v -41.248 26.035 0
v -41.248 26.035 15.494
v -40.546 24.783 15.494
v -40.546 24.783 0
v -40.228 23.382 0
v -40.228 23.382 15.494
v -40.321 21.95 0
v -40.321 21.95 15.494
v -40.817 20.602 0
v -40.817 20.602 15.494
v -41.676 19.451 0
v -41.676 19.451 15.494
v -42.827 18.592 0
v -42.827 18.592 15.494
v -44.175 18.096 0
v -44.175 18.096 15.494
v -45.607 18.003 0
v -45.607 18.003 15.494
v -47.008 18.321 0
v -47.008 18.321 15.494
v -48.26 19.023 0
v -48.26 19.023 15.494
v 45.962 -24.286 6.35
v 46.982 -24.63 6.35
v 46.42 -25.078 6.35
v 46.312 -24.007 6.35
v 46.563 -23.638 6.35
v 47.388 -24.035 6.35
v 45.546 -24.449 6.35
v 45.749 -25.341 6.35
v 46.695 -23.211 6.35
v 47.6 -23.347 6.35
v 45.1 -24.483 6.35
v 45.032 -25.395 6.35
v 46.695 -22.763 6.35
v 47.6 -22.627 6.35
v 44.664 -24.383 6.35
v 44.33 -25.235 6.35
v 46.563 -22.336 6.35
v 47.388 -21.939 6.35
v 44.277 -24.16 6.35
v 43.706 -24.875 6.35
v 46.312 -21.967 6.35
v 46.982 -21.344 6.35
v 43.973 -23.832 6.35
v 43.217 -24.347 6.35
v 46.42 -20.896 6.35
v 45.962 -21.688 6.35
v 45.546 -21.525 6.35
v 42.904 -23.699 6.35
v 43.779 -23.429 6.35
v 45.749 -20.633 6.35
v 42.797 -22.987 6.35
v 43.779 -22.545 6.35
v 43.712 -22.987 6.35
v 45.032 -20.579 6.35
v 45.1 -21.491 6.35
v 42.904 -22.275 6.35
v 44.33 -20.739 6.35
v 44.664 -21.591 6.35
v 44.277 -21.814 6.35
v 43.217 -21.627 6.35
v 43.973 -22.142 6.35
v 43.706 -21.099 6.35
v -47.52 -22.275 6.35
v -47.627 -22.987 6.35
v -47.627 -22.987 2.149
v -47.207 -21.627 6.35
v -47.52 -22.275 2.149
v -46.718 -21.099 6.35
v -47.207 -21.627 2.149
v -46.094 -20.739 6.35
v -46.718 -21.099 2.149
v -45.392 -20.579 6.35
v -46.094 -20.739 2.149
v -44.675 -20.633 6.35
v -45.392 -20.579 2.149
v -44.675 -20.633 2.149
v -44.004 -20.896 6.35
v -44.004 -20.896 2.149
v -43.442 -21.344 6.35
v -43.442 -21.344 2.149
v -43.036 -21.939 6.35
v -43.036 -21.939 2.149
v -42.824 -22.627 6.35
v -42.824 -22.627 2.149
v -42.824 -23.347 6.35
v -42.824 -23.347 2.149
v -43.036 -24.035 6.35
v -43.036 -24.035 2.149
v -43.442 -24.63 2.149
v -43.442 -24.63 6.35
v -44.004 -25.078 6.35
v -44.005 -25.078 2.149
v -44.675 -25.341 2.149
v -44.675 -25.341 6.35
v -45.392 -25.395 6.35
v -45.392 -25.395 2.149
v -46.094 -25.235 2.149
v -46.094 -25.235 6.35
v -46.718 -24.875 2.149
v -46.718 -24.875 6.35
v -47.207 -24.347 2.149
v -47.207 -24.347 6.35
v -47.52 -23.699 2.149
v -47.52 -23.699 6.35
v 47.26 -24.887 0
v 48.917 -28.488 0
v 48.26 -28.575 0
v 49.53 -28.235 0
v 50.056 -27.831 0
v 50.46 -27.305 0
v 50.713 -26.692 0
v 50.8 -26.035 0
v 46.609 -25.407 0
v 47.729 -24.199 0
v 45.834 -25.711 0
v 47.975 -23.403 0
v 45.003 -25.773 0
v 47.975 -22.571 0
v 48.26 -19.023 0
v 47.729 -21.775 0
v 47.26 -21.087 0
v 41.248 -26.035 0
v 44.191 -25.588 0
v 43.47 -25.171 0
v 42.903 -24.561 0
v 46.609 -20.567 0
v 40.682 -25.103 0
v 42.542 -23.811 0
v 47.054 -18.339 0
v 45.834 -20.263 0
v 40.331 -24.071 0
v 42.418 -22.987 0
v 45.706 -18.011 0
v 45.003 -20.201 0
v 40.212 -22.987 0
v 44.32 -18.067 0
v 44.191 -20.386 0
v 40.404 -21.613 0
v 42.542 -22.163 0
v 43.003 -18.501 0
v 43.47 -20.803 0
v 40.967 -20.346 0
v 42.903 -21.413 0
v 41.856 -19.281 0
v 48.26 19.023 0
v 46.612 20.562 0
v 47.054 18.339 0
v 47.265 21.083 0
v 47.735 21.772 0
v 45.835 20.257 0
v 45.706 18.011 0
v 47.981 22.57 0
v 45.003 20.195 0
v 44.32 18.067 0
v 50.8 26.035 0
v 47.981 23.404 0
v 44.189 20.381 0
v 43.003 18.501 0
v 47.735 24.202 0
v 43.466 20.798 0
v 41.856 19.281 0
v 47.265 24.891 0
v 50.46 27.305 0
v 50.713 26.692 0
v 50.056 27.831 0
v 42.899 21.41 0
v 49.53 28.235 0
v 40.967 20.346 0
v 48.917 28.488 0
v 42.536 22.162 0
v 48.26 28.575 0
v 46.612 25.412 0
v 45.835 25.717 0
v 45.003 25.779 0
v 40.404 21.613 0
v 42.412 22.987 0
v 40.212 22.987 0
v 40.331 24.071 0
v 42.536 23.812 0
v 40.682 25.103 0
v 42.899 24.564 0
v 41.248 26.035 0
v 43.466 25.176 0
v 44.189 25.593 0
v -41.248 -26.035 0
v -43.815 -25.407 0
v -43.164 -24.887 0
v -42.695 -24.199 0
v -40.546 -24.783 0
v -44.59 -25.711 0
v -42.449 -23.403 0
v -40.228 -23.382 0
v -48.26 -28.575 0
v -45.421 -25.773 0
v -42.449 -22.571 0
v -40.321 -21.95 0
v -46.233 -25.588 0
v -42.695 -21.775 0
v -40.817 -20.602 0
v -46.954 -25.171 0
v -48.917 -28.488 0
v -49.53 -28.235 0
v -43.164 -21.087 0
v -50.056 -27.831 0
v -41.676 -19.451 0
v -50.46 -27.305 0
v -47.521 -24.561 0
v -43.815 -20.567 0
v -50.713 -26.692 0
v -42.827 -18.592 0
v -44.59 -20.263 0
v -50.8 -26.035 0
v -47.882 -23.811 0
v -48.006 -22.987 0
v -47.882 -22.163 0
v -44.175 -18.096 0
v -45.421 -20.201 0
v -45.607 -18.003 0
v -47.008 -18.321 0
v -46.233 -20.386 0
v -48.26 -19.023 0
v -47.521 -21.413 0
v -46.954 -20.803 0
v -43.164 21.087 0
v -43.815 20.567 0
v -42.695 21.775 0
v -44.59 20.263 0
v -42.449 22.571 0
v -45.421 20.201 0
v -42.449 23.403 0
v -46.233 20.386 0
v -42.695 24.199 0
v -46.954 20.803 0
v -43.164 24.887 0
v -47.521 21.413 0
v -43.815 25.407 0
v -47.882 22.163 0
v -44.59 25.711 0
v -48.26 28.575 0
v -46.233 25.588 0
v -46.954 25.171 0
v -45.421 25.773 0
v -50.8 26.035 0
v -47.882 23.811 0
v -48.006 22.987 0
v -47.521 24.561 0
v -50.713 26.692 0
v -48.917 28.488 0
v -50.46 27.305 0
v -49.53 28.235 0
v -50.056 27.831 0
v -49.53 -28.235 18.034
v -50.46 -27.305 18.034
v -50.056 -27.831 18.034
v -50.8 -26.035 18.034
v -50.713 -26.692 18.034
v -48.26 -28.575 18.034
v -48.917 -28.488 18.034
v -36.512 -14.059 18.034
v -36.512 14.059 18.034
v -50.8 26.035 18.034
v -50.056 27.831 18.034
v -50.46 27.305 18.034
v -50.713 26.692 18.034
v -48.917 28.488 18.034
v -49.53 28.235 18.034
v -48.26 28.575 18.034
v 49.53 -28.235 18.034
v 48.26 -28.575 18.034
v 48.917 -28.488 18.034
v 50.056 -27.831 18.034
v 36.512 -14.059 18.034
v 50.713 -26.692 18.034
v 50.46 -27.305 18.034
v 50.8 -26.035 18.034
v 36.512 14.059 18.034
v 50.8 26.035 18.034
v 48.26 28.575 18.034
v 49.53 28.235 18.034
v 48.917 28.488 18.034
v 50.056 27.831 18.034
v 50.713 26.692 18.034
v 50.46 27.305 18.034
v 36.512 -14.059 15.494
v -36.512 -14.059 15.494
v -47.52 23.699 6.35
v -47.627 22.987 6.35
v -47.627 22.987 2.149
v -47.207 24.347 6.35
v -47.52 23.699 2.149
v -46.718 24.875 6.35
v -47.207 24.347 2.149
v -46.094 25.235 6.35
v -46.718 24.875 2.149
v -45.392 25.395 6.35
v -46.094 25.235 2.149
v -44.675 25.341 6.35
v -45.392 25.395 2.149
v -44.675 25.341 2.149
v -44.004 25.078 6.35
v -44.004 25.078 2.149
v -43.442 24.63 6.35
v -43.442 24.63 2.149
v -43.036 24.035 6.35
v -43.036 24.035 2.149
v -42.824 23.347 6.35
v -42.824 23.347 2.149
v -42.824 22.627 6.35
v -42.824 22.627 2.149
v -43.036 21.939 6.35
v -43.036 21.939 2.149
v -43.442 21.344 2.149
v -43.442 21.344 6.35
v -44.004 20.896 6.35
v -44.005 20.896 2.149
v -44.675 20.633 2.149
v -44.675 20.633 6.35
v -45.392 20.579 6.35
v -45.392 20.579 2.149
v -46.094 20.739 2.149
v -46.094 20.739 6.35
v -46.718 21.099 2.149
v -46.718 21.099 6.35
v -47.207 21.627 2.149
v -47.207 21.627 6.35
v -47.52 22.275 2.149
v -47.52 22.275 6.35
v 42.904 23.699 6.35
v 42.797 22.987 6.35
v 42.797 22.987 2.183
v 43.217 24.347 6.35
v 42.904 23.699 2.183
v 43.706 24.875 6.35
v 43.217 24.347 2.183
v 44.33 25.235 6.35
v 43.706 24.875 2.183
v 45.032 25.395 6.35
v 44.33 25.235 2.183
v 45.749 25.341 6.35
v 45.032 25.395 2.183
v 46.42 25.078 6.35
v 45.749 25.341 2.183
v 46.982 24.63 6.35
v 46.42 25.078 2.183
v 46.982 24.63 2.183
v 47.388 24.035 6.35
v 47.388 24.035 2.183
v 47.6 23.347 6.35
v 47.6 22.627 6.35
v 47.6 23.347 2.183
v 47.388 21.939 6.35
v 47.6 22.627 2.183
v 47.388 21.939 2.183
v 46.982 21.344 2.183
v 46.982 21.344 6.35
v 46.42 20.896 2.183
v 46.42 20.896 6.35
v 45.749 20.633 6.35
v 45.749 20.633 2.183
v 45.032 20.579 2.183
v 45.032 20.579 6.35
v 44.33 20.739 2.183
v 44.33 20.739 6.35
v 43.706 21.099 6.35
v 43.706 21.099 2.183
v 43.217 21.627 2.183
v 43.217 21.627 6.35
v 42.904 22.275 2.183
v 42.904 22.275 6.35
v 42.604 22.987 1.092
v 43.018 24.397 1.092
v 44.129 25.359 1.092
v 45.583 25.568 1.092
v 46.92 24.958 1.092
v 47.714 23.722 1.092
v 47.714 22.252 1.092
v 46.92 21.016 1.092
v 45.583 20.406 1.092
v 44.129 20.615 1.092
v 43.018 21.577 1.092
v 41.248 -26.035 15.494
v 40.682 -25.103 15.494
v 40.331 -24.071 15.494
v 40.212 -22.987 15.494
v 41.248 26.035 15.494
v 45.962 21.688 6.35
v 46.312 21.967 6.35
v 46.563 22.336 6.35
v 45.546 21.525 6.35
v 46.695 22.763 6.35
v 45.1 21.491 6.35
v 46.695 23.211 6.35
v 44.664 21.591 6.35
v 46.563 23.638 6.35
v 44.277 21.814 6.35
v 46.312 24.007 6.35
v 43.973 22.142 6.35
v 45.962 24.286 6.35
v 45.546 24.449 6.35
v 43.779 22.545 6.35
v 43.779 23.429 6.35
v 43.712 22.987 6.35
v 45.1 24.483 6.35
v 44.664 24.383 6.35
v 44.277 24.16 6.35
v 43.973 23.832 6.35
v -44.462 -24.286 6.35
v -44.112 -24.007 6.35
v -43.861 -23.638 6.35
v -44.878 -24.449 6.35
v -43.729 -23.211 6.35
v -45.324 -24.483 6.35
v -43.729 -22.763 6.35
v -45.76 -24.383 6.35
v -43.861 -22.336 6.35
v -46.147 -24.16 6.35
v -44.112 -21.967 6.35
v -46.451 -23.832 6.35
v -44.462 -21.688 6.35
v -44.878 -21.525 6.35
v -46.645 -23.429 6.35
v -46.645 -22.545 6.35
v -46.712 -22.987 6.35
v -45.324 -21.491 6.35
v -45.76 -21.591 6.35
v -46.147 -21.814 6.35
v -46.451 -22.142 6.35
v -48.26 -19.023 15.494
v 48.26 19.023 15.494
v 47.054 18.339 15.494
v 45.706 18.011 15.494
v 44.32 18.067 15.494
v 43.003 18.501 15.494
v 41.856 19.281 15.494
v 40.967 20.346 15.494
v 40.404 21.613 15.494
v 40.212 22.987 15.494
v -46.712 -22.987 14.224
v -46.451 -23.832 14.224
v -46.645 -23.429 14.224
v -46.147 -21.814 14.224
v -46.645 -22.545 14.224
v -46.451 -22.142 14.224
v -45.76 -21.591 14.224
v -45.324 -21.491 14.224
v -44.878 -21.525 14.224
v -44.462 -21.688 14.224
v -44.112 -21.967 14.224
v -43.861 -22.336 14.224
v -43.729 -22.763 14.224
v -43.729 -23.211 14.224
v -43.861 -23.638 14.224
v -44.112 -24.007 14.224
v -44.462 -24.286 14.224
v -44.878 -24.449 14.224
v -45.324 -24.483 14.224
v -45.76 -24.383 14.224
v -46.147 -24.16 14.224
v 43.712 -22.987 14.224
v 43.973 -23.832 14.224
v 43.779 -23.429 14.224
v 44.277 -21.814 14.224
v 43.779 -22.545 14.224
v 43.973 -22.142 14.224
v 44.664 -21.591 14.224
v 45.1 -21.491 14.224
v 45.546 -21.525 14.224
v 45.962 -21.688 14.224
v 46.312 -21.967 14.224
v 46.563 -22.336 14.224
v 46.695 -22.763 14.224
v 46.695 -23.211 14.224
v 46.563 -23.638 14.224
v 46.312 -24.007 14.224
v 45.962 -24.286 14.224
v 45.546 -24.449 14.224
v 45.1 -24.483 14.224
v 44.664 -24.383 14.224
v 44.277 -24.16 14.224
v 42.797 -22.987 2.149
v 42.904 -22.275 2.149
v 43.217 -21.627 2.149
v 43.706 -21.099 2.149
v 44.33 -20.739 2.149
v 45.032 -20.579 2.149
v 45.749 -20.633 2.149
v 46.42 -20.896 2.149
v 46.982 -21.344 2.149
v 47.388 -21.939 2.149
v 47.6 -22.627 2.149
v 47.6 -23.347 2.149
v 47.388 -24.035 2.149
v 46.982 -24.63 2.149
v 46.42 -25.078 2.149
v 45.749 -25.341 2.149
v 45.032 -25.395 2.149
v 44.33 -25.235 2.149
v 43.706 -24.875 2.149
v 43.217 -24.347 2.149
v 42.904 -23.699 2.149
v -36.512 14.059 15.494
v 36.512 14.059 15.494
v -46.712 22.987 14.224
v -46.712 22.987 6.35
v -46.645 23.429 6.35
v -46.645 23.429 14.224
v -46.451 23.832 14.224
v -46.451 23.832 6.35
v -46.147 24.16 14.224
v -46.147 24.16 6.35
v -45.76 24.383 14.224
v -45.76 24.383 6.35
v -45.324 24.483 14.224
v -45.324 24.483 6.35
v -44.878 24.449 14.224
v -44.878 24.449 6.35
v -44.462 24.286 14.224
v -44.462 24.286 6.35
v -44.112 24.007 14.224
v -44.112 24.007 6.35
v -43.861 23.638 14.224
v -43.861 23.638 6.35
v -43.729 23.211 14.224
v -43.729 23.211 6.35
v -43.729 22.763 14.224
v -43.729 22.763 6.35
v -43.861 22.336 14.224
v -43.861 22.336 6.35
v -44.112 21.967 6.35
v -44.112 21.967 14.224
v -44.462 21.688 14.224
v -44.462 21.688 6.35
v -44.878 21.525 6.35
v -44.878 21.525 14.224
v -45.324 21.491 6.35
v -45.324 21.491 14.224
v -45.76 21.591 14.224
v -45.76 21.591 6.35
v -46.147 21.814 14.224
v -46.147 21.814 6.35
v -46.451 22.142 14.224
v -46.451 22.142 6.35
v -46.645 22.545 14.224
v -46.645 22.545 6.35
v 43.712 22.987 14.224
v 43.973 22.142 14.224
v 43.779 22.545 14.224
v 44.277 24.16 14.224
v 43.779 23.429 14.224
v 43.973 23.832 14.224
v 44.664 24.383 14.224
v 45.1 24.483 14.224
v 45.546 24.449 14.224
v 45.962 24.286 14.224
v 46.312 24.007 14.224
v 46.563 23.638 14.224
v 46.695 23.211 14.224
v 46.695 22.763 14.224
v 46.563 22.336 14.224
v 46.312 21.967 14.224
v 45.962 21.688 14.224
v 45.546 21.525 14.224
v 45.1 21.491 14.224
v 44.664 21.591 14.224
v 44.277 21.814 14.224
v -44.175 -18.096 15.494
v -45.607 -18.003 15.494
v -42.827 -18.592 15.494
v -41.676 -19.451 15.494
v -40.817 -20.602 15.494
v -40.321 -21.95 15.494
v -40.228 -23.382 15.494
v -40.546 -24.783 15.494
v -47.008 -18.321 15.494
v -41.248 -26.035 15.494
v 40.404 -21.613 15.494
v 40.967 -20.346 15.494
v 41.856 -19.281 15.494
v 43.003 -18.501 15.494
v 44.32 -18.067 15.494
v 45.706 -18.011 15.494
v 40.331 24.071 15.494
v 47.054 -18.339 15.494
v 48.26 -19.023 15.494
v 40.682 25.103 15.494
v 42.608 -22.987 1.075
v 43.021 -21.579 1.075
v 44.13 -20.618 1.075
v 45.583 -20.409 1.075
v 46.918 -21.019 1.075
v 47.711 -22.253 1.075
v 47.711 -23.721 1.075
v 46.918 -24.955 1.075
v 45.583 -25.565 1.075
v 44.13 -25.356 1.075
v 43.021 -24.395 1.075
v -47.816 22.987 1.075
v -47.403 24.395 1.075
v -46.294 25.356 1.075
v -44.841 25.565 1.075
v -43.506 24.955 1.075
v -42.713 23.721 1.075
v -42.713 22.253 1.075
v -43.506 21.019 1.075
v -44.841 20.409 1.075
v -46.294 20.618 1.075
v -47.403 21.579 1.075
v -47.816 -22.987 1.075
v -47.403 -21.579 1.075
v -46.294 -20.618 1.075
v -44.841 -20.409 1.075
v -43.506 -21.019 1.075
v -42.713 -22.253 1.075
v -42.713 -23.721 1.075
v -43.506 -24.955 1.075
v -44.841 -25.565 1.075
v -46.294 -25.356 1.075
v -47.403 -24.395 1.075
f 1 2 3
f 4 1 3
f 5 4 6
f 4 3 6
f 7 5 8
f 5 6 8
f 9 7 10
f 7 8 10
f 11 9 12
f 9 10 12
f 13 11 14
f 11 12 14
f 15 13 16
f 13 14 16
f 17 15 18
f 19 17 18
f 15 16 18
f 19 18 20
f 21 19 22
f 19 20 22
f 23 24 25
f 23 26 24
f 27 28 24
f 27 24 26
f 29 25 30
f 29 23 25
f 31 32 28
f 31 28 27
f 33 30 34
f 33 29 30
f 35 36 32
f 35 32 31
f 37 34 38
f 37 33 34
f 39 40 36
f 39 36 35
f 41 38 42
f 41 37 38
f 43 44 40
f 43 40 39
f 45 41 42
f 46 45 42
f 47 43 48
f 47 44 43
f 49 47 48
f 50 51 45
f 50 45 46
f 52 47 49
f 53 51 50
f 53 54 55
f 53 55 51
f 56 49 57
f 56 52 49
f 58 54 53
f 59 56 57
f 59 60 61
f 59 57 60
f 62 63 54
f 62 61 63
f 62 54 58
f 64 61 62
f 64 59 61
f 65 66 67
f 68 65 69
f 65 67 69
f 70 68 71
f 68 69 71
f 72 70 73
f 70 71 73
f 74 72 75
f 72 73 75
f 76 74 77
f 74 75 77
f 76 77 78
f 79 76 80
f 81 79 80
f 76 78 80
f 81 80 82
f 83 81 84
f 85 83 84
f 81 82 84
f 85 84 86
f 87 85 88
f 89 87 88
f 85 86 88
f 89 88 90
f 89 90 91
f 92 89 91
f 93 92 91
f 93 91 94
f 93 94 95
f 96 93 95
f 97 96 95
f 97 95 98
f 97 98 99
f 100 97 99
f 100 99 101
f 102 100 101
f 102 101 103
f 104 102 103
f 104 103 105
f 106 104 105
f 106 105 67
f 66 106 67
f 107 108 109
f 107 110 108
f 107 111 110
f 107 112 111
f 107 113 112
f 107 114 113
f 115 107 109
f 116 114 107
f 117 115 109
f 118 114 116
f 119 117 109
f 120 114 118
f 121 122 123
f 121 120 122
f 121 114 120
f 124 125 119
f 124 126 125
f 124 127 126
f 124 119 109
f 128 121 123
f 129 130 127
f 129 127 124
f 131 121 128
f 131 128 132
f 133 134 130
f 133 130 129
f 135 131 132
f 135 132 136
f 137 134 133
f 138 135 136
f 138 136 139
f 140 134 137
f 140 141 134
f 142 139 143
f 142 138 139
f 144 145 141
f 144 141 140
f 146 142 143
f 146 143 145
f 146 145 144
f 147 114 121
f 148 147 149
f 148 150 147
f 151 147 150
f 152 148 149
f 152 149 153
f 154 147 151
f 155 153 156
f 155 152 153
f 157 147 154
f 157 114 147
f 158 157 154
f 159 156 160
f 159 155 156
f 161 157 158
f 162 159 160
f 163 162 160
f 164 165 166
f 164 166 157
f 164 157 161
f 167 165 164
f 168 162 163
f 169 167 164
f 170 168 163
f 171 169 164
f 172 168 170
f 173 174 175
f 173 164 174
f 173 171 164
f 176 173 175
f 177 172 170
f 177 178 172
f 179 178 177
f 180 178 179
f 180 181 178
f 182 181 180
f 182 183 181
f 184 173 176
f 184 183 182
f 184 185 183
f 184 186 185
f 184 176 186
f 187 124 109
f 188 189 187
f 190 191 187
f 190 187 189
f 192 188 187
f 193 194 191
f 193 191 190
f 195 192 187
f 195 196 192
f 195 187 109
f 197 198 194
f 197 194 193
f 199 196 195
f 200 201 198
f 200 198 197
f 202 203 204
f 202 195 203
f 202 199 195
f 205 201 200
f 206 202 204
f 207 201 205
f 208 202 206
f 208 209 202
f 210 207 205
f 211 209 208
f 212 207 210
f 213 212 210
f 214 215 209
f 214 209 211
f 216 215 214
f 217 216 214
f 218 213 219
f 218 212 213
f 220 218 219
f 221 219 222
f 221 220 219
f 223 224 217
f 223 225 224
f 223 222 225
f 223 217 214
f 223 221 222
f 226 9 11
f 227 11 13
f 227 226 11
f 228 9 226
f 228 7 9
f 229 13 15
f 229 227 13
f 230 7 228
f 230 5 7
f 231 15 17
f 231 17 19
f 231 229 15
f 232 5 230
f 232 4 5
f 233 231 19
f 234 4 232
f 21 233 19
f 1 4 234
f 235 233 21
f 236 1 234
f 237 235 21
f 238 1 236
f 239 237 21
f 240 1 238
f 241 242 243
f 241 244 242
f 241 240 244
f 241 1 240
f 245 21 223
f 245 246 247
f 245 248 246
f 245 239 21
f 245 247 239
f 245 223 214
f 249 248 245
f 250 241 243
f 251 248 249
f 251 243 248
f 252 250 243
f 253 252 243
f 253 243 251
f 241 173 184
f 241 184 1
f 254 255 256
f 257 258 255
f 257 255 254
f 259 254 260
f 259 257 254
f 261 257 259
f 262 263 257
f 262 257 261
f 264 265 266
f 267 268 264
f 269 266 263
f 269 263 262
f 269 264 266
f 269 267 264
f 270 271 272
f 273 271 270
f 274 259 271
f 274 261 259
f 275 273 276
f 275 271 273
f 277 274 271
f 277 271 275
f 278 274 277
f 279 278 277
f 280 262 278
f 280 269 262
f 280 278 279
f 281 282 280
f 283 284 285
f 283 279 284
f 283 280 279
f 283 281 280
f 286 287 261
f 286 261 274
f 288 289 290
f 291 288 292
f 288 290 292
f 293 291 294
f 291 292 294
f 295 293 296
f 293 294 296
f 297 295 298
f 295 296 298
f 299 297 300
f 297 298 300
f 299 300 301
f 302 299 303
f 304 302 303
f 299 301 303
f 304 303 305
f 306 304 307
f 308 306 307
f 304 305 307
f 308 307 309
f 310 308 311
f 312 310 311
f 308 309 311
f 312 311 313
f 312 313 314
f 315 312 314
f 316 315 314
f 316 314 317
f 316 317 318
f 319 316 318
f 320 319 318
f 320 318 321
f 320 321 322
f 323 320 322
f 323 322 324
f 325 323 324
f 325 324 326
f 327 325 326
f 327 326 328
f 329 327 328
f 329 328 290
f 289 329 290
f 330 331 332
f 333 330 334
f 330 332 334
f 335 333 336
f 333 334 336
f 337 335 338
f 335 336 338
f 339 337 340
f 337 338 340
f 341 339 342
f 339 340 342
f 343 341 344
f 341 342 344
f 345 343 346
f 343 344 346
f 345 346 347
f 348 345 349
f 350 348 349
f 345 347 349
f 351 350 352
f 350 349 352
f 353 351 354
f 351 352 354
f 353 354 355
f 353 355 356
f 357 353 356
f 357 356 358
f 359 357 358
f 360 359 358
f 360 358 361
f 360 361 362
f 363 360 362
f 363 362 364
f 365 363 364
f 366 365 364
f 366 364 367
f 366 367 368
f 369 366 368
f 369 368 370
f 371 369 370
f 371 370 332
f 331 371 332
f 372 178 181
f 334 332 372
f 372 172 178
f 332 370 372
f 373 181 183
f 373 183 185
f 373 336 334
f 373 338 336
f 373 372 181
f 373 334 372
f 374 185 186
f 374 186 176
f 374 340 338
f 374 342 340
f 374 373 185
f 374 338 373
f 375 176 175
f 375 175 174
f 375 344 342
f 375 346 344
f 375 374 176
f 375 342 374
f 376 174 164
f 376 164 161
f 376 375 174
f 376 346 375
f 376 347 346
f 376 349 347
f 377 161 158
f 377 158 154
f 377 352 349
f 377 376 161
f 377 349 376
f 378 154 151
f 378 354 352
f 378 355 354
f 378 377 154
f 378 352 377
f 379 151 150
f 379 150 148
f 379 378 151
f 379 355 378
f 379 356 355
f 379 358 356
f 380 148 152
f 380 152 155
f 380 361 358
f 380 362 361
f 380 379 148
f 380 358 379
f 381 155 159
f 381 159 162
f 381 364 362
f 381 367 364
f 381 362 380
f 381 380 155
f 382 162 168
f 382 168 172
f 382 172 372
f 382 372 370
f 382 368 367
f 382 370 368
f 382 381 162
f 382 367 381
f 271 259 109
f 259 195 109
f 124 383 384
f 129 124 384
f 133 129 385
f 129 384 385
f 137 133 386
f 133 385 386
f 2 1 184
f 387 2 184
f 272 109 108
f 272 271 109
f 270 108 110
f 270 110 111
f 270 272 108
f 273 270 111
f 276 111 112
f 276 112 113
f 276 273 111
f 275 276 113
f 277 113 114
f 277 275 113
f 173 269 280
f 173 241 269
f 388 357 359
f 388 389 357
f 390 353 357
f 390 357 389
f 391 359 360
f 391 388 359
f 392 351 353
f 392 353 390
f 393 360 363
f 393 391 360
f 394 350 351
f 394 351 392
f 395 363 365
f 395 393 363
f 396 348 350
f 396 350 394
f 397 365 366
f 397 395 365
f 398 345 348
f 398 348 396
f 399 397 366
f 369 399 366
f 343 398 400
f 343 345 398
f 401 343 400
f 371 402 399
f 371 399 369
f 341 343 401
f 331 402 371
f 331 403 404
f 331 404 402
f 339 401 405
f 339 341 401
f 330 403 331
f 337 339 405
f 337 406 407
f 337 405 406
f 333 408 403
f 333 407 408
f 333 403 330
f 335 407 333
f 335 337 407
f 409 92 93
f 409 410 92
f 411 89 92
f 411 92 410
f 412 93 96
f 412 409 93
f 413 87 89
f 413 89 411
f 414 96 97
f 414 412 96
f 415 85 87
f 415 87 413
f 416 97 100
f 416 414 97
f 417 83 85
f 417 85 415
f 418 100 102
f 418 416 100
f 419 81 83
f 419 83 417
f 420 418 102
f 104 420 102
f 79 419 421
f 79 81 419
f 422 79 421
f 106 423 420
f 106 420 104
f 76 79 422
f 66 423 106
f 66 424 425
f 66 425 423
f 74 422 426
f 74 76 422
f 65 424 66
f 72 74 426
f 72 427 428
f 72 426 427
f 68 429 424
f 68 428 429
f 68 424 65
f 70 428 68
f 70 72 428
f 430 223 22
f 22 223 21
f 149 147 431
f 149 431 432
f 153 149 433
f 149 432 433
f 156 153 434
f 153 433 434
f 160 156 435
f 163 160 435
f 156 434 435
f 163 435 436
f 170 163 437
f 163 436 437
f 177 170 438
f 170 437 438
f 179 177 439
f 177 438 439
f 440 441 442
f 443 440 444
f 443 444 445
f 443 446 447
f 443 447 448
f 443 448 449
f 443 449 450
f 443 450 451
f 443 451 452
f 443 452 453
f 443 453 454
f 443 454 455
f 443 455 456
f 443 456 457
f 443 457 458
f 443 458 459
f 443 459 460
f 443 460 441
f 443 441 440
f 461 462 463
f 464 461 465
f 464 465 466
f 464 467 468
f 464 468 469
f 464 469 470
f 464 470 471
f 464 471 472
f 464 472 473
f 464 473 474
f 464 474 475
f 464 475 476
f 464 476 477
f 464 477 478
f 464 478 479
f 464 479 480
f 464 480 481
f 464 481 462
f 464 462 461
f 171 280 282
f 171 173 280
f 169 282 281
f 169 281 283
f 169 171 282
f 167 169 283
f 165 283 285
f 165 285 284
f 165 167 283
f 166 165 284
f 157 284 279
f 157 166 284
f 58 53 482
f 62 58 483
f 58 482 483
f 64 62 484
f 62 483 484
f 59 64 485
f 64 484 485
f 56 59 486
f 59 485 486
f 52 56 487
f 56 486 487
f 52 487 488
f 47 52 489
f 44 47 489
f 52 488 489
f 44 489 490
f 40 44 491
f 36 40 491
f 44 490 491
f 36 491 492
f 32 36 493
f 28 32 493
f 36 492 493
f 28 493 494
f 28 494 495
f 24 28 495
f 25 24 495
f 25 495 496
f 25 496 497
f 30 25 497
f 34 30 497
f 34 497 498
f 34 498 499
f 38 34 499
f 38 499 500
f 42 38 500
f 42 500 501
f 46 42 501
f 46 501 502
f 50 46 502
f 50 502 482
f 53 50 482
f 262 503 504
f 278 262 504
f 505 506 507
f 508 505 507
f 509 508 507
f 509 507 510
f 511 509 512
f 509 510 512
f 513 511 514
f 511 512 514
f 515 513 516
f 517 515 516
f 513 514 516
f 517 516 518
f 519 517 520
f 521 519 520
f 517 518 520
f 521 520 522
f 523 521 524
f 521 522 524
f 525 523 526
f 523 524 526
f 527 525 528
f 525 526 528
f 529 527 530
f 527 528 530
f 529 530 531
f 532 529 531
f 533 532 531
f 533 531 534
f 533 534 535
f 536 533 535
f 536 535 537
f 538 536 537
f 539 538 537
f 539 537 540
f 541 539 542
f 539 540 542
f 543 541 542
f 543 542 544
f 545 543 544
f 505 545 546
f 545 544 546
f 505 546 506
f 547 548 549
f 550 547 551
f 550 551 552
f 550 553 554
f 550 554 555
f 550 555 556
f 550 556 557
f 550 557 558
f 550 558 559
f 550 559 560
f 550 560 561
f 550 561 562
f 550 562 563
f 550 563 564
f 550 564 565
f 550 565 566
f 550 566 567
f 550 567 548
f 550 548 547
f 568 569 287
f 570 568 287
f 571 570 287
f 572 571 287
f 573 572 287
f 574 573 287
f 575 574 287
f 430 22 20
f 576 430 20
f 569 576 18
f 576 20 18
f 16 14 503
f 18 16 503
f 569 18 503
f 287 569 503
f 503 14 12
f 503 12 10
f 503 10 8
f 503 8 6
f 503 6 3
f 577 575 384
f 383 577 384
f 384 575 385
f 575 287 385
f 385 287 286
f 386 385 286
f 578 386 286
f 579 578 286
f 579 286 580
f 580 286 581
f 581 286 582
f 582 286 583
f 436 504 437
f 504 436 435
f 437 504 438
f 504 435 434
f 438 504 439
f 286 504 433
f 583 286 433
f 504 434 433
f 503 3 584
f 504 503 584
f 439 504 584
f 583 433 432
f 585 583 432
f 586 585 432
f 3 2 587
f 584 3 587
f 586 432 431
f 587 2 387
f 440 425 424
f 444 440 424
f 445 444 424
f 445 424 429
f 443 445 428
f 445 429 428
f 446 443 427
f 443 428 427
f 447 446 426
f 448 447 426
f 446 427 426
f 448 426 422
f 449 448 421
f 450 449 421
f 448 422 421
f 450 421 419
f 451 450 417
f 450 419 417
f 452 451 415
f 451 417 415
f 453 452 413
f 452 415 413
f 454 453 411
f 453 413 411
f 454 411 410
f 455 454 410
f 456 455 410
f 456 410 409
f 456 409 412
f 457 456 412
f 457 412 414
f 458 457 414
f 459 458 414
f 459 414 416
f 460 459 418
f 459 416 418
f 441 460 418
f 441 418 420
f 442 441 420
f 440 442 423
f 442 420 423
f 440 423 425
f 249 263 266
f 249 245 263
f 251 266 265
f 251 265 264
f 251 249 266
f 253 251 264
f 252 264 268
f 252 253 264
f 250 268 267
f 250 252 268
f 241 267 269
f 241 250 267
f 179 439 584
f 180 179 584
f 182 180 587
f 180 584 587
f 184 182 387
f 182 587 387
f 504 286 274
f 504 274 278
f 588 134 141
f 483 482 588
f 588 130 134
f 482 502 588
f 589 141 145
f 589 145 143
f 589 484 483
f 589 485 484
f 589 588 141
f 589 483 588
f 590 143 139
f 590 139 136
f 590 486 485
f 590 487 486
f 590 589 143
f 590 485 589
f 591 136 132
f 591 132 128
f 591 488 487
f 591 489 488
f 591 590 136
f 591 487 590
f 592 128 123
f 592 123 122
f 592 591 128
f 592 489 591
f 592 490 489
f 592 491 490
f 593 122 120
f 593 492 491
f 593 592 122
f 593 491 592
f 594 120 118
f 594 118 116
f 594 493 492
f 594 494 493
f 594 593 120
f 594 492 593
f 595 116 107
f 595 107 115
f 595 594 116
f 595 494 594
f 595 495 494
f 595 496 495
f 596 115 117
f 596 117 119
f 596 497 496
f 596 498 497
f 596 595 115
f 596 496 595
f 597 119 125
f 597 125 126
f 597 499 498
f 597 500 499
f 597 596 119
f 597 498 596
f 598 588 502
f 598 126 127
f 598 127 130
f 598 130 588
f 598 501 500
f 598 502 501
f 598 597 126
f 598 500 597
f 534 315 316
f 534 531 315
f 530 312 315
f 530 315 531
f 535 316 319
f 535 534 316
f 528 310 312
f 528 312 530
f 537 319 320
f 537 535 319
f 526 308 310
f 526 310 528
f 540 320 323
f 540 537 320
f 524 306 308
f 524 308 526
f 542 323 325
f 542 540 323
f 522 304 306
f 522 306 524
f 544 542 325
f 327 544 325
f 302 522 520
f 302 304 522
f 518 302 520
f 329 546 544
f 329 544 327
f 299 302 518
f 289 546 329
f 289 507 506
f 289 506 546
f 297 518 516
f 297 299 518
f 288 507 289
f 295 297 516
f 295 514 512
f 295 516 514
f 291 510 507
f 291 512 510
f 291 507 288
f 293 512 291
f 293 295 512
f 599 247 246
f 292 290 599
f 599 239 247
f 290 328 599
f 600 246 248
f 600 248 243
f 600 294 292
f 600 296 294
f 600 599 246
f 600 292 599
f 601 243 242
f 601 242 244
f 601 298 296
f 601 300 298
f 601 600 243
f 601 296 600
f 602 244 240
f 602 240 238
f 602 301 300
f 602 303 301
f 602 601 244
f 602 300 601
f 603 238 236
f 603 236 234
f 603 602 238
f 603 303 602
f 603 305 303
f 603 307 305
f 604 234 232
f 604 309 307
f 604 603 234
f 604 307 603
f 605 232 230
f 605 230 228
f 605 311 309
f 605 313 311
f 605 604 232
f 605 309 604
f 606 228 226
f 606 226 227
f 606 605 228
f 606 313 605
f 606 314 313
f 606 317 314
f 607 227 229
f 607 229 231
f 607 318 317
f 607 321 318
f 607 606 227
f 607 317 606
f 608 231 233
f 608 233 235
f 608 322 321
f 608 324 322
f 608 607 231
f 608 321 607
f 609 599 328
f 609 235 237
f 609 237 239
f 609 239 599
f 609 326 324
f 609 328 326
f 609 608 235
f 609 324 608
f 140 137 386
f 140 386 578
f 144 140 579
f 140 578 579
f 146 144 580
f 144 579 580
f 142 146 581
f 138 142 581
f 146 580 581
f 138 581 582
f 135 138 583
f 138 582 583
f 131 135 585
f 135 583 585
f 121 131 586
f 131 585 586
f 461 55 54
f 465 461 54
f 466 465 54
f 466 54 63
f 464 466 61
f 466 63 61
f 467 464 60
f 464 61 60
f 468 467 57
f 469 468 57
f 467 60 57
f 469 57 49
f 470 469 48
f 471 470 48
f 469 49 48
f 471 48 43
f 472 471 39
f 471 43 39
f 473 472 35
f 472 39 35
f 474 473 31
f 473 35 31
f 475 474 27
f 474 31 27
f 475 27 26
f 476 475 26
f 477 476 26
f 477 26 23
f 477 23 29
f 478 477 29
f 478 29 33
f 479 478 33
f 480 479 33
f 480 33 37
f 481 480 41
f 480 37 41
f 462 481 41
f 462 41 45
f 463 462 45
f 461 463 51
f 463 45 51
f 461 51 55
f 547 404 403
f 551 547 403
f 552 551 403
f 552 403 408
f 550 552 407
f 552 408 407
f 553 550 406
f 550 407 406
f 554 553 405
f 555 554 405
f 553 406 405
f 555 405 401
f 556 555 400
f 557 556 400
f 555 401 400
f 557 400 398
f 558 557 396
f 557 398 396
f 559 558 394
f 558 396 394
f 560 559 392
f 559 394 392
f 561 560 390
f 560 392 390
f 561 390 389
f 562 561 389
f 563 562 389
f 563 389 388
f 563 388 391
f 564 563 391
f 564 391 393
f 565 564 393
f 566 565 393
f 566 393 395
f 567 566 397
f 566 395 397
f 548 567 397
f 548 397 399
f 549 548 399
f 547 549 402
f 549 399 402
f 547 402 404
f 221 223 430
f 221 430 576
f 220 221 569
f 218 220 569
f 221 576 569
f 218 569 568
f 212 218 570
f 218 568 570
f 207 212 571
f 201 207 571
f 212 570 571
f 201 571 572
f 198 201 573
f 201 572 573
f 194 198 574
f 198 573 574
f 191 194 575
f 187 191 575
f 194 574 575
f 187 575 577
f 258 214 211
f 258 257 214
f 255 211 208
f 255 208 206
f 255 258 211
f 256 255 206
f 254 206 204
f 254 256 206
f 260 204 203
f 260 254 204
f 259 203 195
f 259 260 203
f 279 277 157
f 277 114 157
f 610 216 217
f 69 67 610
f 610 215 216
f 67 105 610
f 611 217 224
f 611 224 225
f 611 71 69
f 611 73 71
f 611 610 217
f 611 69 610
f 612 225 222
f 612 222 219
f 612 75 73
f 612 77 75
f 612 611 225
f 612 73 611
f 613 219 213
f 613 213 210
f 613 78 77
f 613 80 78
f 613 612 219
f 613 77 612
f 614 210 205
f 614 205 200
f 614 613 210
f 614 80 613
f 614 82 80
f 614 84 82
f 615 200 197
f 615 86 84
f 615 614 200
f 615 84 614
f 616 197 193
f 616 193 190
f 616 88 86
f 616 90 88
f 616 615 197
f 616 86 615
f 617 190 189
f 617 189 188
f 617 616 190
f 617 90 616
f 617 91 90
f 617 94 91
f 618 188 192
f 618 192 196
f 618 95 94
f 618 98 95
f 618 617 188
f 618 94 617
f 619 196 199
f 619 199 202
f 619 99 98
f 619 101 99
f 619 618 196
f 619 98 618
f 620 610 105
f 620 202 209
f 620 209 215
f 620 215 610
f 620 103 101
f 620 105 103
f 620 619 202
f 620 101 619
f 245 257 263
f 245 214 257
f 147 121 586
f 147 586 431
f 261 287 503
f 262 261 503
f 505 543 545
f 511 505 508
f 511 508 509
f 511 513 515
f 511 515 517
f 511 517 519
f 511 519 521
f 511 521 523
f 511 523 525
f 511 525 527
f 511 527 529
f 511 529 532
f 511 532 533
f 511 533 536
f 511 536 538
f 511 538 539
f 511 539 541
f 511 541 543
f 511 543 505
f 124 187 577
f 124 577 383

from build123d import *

# Parameters (mm, degrees)
SKETCH1_W           = 101.6
SKETCH1_H           = 57.15
SKETCH1_W_2         = 96.52
SKETCH1_H_2         = 52.07
BOSS_EXTRUDE1_DEPTH = 15.494
SKETCH2_W           = 101.6
SKETCH2_H           = 57.15
SKETCH2_W_2         = 73.025
SKETCH2_H_2         = 28.1178
BOSS_EXTRUDE2_DEPTH = 2.54
SKETCH3_R           = 5
BOSS_EXTRUDE3_DEPTH = 15.494
SKETCH4_R           = 2.415
CUT_EXTRUDE1_DEPTH  = 6.35
SKETCH5_R           = 1.5
CUT_EXTRUDE2_DEPTH  = 7.874
FILLET1_R           = 2.54


with BuildPart() as part:
    # Sketch1 → Boss-Extrude1 (new body)
    with BuildSketch(Plane.XY):
        Rectangle(SKETCH1_W, SKETCH1_H)
        Rectangle(SKETCH1_W_2, SKETCH1_H_2, mode=Mode.SUBTRACT)
    extrude(amount=BOSS_EXTRUDE1_DEPTH)

    # Sketch2 → Boss-Extrude2 (add)
    with BuildSketch(Plane.XY.offset(15.494)):
        Rectangle(SKETCH2_W, SKETCH2_H)
        Rectangle(SKETCH2_W_2, SKETCH2_H_2, mode=Mode.SUBTRACT)
    extrude(amount=BOSS_EXTRUDE2_DEPTH)

    # Sketch3 → Boss-Extrude3 (add)
    with BuildSketch(Plane(origin=(0, 0, 15.494), x_dir=(-1, 0, 0), z_dir=(0, 0, -1))):
        with BuildLine():
            ThreePointArc((-48.26, 19.023454113), (-43.002927797, 18.501467702), (-40.212, 22.987))
            ThreePointArc((-40.212, 22.987), (-40.478199759, 24.59670037), (-41.248454113, 26.035))
            Line((-41.248454113, 26.035), (-48.26, 26.035))
            Line((-48.26, 26.035), (-48.26, 19.023454113))
        make_face()
        with BuildLine():
            Line((-48.26, 26.035), (-41.248454113, 26.035))
            ThreePointArc((-41.248454113, 26.035), (-48.747533906, 26.522533906), (-48.26, 19.023454113))
            Line((-48.26, 19.023454113), (-48.26, 26.035))
        make_face()
        with BuildLine():
            Line((48.26, 26.035), (41.248454113, 26.035))
            ThreePointArc((41.248454113, 26.035), (41.676466094, 19.451466094), (48.26, 19.023454113))
            Line((48.26, 19.023454113), (48.26, 26.035))
        make_face()
        with BuildLine():
            ThreePointArc((50.212, 22.987), (46.82170037, 27.720800241), (41.248454113, 26.035))
            Line((41.248454113, 26.035), (48.26, 26.035))
            Line((48.26, 26.035), (48.26, 19.023454113))
            ThreePointArc((48.26, 19.023454113), (49.697532298, 20.777927797), (50.212, 22.987))
        make_face()
        with BuildLine():
            Line((-48.26, -26.035), (-48.26, -19.023454113))
            ThreePointArc((-48.26, -19.023454113), (-48.747533906, -26.522533906), (-41.248454113, -26.035))
            Line((-41.248454113, -26.035), (-48.26, -26.035))
        make_face()
        with BuildLine():
            ThreePointArc((-40.212, -22.987), (-43.002927797, -18.501467702), (-48.26, -19.023454113))
            Line((-48.26, -19.023454113), (-48.26, -26.035))
            Line((-48.26, -26.035), (-41.248454113, -26.035))
            ThreePointArc((-41.248454113, -26.035), (-40.478199759, -24.59670037), (-40.212, -22.987))
        make_face()
        with Locations((45.212, -22.987)):
            Circle(SKETCH3_R)
    extrude(amount=BOSS_EXTRUDE3_DEPTH)

    # Sketch4 → Cut-Extrude1 (cut)
    with BuildSketch(Plane(origin=(0, 0, 0), x_dir=(-1, 0, 0), z_dir=(0, 0, -1))):
        with Locations((-45.212, 22.987)):
            Circle(SKETCH4_R)
        with Locations((-45.212, -22.987)):
            Circle(SKETCH4_R)
        with Locations((45.212, -22.987)):
            Circle(SKETCH4_R)
        with Locations((45.212, 22.987)):
            Circle(SKETCH4_R)
    extrude(amount=-CUT_EXTRUDE1_DEPTH, mode=Mode.SUBTRACT)

    # Sketch5 → Cut-Extrude2 (cut)
    with BuildSketch(Plane(origin=(0, 0, 6.35), x_dir=(-1, 0, 0), z_dir=(0, 0, -1))):
        with Locations((-45.212, 22.987)):
            Circle(SKETCH5_R)
        with Locations((45.212, -22.987)):
            Circle(SKETCH5_R)
        with Locations((-45.212, -22.987)):
            Circle(SKETCH5_R)
        with Locations((45.212, 22.987)):
            Circle(SKETCH5_R)
    extrude(amount=-CUT_EXTRUDE2_DEPTH, mode=Mode.SUBTRACT)

    # Sketch6 → Cut-Revolve1 (revolve, cut)
    with BuildSketch(Plane(origin=(0, 22.987, 0), x_dir=(0, 0, -1), z_dir=(0, -1, 0)), mode=Mode.PRIVATE) as cut_revolve1_sk:
        Polygon((0, 48.012), (-6.35, 46.892323673), (-6.35, 45.212), (0, 45.212), align=None)
    revolve(cut_revolve1_sk.sketch.rotate(Axis((45.212, 22.987, 6.35), (0, 0, -1)), 180), axis=Axis((45.212, 22.987, 6.35), (0, 0, -1)), mode=Mode.SUBTRACT)

    # Sketch7 → Cut-Revolve2 (revolve, cut)
    with BuildSketch(Plane(origin=(0, -22.987, 0), x_dir=(0, 0, -1), z_dir=(0, 1, 0))):
        Polygon((0, 48.006), (-6.35, 46.886323673), (-6.35, 45.212), (0, 45.212), align=None)
    revolve(axis=Axis((-45.212, -22.987, 6.35), (0, 0, -1)), mode=Mode.SUBTRACT)

    # Sketch8 → Cut-Revolve3 (revolve, cut)
    with BuildSketch(Plane(origin=(0, 22.987, 0), x_dir=(0, 0, -1), z_dir=(0, 1, 0))):
        Polygon((0, 48.006), (-6.35, 46.886323673), (-6.35, 45.212), (0, 45.212), align=None)
    revolve(axis=Axis((-45.212, 22.987, 6.35), (0, 0, -1)), mode=Mode.SUBTRACT)

    # Sketch9 → Cut-Revolve4 (revolve, cut)
    with BuildSketch(Plane(origin=(0, -22.987, 0), x_dir=(0, 0, -1), z_dir=(0, -1, 0)), mode=Mode.PRIVATE) as cut_revolve4_sk:
        Polygon((0, 48.006), (-6.35, 46.886323673), (-6.35, 45.212), (0, 45.212), align=None)
    revolve(cut_revolve4_sk.sketch.rotate(Axis((45.212, -22.987, 6.35), (0, 0, -1)), 180), axis=Axis((45.212, -22.987, 6.35), (0, 0, -1)), mode=Mode.SUBTRACT)

    # Fillet1
    fillet1_edges = [part.edges().sort_by_distance(p)[0] for p in [
        (-50.8, 28.575, 9.017),
        (50.8, 28.575, 9.017),
        (50.8, -28.575, 9.017),
        (-50.8, -28.575, 9.017),
    ]]
    fillet(fillet1_edges, radius=FILLET1_R)


solid = part.part
